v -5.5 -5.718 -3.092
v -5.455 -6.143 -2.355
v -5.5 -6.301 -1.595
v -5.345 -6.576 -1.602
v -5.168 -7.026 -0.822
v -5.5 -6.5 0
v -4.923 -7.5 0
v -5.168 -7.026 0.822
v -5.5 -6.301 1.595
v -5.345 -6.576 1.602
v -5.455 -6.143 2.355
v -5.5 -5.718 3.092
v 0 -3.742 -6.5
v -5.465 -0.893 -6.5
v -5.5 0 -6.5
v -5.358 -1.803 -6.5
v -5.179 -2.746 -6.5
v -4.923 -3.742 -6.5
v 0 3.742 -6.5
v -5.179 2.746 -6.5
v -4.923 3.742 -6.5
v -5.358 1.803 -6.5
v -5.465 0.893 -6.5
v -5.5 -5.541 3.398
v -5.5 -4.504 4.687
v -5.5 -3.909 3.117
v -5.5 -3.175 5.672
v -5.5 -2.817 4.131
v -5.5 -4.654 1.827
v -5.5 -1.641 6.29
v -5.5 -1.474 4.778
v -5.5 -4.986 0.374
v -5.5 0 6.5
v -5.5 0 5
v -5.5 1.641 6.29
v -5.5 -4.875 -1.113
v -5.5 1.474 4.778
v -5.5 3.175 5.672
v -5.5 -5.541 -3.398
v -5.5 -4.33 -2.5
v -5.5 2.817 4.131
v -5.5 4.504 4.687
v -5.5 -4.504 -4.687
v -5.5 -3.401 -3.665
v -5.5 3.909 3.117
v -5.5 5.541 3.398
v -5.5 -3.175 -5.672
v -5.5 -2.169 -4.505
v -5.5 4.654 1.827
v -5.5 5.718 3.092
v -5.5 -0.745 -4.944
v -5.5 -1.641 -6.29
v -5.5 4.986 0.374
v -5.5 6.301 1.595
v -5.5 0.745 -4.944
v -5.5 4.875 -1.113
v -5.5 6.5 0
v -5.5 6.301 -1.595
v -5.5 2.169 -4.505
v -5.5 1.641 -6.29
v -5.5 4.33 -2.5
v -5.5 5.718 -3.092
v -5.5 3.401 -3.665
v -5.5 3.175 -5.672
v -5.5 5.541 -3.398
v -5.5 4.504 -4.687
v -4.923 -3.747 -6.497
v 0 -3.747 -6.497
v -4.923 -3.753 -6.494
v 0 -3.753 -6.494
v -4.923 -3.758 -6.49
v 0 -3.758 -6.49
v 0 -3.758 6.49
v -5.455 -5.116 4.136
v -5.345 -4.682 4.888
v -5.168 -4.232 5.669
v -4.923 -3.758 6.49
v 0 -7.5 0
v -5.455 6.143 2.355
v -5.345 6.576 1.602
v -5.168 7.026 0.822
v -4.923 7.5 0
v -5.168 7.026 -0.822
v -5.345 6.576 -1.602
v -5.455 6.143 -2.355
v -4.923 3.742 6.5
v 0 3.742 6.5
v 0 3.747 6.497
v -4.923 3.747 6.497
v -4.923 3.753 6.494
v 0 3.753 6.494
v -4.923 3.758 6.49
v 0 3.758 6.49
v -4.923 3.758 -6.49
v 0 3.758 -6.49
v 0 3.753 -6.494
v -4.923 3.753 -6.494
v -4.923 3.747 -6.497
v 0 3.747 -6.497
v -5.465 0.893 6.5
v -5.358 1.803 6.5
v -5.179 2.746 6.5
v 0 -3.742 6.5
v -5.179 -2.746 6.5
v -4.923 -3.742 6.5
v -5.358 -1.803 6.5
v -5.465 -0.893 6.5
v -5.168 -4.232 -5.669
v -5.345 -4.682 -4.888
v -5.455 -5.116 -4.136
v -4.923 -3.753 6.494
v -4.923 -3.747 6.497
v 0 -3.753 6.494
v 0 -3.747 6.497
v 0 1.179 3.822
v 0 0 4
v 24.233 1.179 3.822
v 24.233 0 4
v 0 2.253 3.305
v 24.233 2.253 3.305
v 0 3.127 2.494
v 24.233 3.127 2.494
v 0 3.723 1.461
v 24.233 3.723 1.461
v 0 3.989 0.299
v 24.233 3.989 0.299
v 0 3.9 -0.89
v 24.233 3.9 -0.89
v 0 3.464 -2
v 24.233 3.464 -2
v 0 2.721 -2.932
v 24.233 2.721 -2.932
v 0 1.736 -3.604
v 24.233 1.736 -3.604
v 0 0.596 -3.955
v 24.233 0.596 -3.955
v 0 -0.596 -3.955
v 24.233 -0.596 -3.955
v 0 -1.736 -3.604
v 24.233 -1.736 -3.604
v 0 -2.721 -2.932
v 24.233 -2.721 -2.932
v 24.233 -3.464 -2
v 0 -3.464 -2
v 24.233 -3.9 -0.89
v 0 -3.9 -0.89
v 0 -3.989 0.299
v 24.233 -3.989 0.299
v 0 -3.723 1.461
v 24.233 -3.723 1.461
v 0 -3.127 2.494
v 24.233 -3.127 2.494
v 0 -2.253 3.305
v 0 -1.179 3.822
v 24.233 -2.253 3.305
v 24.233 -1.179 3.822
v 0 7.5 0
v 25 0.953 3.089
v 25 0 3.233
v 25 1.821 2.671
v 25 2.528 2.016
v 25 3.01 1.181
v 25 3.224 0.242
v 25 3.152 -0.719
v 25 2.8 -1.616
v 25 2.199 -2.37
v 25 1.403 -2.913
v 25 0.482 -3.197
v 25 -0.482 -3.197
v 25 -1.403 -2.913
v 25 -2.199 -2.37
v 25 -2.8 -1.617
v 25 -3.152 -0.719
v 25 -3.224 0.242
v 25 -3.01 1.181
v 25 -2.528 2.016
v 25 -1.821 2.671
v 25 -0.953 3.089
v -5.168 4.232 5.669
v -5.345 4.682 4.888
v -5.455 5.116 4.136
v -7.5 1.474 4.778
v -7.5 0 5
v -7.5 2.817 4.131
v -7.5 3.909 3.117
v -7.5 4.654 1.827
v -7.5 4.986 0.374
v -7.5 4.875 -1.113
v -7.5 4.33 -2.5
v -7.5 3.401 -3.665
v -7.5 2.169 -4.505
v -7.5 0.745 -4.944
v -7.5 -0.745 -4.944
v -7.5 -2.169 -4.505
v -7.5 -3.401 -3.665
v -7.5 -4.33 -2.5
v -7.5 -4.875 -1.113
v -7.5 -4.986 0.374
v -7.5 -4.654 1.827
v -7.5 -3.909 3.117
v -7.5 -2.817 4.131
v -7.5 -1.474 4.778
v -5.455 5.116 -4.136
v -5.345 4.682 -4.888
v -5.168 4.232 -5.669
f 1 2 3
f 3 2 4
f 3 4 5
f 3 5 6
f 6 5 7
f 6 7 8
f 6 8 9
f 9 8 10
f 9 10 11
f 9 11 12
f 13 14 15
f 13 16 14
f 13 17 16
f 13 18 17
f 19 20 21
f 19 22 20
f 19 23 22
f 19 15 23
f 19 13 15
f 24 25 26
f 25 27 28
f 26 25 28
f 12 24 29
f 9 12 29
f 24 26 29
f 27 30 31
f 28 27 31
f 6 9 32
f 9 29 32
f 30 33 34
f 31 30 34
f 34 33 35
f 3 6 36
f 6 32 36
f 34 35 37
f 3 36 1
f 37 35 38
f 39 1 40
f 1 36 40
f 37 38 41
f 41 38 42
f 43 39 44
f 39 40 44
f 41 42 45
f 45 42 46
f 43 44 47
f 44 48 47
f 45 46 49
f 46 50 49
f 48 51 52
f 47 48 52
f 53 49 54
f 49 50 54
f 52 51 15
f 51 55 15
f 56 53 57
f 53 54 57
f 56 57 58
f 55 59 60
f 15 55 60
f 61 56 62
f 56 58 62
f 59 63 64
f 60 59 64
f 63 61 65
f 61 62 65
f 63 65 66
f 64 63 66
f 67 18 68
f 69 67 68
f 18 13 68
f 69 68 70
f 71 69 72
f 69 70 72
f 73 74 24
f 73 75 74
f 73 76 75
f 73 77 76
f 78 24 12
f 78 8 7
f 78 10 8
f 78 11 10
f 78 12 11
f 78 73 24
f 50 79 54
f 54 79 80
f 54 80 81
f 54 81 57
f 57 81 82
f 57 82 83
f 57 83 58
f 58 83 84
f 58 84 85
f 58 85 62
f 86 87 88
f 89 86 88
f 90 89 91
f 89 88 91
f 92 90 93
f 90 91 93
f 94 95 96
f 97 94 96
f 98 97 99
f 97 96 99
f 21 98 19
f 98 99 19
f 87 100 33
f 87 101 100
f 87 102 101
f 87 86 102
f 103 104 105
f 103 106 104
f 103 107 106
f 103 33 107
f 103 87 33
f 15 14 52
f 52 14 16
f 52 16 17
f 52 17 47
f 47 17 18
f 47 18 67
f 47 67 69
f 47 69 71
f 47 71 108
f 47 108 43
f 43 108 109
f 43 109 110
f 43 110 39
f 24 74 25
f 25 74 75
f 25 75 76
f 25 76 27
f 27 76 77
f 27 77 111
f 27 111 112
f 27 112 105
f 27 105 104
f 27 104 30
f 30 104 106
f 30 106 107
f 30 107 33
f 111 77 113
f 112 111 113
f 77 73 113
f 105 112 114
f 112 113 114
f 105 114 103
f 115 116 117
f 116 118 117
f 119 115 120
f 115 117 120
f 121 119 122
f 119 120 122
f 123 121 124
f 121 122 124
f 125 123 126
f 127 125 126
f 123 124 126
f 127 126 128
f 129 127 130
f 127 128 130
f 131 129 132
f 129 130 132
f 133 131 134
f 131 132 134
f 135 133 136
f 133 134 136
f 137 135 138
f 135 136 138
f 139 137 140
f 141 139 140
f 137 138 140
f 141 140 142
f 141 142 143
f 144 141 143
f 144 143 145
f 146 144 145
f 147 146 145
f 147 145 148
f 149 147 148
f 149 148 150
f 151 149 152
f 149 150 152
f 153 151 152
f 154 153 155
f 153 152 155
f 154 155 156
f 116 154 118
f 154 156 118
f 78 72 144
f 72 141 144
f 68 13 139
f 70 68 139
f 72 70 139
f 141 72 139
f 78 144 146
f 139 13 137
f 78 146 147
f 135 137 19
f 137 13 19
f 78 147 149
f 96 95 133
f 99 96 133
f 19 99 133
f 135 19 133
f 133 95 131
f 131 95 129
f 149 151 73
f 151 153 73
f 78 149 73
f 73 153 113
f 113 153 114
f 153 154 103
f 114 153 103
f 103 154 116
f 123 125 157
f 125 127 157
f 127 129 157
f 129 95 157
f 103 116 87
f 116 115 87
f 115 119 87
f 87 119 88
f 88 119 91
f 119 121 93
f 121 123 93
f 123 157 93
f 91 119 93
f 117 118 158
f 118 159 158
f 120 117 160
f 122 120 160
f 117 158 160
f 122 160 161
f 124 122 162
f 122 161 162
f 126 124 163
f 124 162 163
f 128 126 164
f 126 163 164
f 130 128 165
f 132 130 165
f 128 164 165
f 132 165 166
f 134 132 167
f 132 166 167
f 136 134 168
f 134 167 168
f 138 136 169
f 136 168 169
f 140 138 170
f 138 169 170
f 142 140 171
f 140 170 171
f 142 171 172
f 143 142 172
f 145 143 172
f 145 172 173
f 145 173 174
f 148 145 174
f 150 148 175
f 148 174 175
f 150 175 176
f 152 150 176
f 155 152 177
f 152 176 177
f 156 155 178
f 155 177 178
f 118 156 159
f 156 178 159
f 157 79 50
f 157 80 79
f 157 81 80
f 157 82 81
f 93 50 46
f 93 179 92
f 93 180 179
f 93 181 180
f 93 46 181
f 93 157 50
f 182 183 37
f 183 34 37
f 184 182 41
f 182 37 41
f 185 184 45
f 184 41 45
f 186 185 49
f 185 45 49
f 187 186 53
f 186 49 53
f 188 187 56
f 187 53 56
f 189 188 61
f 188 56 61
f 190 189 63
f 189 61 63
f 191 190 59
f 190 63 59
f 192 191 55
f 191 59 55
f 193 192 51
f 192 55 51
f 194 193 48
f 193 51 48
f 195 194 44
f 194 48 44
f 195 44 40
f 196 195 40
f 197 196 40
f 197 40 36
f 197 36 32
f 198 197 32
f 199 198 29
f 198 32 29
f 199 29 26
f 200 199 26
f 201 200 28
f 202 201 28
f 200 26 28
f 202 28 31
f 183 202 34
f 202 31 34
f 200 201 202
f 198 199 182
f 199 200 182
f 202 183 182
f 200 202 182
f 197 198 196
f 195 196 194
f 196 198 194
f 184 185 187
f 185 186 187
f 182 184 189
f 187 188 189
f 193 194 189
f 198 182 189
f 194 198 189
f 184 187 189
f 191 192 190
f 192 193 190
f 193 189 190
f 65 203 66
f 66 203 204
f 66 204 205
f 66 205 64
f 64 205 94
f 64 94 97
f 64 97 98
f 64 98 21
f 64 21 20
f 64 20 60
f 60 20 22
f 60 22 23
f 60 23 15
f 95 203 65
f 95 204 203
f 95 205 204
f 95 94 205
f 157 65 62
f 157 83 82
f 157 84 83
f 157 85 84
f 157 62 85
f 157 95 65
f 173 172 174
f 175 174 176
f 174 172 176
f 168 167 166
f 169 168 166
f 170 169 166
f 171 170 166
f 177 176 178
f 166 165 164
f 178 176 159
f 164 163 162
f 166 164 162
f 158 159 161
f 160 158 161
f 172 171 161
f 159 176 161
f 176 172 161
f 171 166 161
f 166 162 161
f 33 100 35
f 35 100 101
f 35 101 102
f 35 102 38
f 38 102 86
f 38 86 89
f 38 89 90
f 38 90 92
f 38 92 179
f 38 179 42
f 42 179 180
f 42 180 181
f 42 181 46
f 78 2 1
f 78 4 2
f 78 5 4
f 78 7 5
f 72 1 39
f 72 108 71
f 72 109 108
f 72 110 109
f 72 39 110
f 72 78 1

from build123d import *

# Parameters (mm, degrees)
SKETCH_2_W          = 30
SKETCH_2_H          = 30
CUT_EXTRUDE_1_DEPTH = 7.5


with BuildPart() as part:
    # 草图1 → 旋转1 (revolve)
    with BuildSketch(Plane.XY):
        Polygon((-7.5, 0), (-7.5, 5), (-5.5, 5), (-5.5, 6.5), (-4.922649731, 7.5), (0, 7.5), (0, 4), (24.233, 4), (25, 3.233), (25, 0), align=None)
    revolve(axis=Axis((25, 0, 0), (-1, 0, 0)))

    # 草图2 → 切除-拉伸1 (cut)
    with BuildSketch(Plane(origin=(0, 0, 0), x_dir=(0, 0, -1), z_dir=(1, 0, 0))):
        Rectangle(SKETCH_2_W, SKETCH_2_H)
        Polygon((-6.5, 3.75277675), (-6.5, -3.75277675), (0, -7.5), (6.5, -3.75277675), (6.5, 3.75277675), (0, 7.5), align=None, mode=Mode.SUBTRACT)
    extrude(amount=-CUT_EXTRUDE_1_DEPTH, mode=Mode.SUBTRACT)


solid = part.part
